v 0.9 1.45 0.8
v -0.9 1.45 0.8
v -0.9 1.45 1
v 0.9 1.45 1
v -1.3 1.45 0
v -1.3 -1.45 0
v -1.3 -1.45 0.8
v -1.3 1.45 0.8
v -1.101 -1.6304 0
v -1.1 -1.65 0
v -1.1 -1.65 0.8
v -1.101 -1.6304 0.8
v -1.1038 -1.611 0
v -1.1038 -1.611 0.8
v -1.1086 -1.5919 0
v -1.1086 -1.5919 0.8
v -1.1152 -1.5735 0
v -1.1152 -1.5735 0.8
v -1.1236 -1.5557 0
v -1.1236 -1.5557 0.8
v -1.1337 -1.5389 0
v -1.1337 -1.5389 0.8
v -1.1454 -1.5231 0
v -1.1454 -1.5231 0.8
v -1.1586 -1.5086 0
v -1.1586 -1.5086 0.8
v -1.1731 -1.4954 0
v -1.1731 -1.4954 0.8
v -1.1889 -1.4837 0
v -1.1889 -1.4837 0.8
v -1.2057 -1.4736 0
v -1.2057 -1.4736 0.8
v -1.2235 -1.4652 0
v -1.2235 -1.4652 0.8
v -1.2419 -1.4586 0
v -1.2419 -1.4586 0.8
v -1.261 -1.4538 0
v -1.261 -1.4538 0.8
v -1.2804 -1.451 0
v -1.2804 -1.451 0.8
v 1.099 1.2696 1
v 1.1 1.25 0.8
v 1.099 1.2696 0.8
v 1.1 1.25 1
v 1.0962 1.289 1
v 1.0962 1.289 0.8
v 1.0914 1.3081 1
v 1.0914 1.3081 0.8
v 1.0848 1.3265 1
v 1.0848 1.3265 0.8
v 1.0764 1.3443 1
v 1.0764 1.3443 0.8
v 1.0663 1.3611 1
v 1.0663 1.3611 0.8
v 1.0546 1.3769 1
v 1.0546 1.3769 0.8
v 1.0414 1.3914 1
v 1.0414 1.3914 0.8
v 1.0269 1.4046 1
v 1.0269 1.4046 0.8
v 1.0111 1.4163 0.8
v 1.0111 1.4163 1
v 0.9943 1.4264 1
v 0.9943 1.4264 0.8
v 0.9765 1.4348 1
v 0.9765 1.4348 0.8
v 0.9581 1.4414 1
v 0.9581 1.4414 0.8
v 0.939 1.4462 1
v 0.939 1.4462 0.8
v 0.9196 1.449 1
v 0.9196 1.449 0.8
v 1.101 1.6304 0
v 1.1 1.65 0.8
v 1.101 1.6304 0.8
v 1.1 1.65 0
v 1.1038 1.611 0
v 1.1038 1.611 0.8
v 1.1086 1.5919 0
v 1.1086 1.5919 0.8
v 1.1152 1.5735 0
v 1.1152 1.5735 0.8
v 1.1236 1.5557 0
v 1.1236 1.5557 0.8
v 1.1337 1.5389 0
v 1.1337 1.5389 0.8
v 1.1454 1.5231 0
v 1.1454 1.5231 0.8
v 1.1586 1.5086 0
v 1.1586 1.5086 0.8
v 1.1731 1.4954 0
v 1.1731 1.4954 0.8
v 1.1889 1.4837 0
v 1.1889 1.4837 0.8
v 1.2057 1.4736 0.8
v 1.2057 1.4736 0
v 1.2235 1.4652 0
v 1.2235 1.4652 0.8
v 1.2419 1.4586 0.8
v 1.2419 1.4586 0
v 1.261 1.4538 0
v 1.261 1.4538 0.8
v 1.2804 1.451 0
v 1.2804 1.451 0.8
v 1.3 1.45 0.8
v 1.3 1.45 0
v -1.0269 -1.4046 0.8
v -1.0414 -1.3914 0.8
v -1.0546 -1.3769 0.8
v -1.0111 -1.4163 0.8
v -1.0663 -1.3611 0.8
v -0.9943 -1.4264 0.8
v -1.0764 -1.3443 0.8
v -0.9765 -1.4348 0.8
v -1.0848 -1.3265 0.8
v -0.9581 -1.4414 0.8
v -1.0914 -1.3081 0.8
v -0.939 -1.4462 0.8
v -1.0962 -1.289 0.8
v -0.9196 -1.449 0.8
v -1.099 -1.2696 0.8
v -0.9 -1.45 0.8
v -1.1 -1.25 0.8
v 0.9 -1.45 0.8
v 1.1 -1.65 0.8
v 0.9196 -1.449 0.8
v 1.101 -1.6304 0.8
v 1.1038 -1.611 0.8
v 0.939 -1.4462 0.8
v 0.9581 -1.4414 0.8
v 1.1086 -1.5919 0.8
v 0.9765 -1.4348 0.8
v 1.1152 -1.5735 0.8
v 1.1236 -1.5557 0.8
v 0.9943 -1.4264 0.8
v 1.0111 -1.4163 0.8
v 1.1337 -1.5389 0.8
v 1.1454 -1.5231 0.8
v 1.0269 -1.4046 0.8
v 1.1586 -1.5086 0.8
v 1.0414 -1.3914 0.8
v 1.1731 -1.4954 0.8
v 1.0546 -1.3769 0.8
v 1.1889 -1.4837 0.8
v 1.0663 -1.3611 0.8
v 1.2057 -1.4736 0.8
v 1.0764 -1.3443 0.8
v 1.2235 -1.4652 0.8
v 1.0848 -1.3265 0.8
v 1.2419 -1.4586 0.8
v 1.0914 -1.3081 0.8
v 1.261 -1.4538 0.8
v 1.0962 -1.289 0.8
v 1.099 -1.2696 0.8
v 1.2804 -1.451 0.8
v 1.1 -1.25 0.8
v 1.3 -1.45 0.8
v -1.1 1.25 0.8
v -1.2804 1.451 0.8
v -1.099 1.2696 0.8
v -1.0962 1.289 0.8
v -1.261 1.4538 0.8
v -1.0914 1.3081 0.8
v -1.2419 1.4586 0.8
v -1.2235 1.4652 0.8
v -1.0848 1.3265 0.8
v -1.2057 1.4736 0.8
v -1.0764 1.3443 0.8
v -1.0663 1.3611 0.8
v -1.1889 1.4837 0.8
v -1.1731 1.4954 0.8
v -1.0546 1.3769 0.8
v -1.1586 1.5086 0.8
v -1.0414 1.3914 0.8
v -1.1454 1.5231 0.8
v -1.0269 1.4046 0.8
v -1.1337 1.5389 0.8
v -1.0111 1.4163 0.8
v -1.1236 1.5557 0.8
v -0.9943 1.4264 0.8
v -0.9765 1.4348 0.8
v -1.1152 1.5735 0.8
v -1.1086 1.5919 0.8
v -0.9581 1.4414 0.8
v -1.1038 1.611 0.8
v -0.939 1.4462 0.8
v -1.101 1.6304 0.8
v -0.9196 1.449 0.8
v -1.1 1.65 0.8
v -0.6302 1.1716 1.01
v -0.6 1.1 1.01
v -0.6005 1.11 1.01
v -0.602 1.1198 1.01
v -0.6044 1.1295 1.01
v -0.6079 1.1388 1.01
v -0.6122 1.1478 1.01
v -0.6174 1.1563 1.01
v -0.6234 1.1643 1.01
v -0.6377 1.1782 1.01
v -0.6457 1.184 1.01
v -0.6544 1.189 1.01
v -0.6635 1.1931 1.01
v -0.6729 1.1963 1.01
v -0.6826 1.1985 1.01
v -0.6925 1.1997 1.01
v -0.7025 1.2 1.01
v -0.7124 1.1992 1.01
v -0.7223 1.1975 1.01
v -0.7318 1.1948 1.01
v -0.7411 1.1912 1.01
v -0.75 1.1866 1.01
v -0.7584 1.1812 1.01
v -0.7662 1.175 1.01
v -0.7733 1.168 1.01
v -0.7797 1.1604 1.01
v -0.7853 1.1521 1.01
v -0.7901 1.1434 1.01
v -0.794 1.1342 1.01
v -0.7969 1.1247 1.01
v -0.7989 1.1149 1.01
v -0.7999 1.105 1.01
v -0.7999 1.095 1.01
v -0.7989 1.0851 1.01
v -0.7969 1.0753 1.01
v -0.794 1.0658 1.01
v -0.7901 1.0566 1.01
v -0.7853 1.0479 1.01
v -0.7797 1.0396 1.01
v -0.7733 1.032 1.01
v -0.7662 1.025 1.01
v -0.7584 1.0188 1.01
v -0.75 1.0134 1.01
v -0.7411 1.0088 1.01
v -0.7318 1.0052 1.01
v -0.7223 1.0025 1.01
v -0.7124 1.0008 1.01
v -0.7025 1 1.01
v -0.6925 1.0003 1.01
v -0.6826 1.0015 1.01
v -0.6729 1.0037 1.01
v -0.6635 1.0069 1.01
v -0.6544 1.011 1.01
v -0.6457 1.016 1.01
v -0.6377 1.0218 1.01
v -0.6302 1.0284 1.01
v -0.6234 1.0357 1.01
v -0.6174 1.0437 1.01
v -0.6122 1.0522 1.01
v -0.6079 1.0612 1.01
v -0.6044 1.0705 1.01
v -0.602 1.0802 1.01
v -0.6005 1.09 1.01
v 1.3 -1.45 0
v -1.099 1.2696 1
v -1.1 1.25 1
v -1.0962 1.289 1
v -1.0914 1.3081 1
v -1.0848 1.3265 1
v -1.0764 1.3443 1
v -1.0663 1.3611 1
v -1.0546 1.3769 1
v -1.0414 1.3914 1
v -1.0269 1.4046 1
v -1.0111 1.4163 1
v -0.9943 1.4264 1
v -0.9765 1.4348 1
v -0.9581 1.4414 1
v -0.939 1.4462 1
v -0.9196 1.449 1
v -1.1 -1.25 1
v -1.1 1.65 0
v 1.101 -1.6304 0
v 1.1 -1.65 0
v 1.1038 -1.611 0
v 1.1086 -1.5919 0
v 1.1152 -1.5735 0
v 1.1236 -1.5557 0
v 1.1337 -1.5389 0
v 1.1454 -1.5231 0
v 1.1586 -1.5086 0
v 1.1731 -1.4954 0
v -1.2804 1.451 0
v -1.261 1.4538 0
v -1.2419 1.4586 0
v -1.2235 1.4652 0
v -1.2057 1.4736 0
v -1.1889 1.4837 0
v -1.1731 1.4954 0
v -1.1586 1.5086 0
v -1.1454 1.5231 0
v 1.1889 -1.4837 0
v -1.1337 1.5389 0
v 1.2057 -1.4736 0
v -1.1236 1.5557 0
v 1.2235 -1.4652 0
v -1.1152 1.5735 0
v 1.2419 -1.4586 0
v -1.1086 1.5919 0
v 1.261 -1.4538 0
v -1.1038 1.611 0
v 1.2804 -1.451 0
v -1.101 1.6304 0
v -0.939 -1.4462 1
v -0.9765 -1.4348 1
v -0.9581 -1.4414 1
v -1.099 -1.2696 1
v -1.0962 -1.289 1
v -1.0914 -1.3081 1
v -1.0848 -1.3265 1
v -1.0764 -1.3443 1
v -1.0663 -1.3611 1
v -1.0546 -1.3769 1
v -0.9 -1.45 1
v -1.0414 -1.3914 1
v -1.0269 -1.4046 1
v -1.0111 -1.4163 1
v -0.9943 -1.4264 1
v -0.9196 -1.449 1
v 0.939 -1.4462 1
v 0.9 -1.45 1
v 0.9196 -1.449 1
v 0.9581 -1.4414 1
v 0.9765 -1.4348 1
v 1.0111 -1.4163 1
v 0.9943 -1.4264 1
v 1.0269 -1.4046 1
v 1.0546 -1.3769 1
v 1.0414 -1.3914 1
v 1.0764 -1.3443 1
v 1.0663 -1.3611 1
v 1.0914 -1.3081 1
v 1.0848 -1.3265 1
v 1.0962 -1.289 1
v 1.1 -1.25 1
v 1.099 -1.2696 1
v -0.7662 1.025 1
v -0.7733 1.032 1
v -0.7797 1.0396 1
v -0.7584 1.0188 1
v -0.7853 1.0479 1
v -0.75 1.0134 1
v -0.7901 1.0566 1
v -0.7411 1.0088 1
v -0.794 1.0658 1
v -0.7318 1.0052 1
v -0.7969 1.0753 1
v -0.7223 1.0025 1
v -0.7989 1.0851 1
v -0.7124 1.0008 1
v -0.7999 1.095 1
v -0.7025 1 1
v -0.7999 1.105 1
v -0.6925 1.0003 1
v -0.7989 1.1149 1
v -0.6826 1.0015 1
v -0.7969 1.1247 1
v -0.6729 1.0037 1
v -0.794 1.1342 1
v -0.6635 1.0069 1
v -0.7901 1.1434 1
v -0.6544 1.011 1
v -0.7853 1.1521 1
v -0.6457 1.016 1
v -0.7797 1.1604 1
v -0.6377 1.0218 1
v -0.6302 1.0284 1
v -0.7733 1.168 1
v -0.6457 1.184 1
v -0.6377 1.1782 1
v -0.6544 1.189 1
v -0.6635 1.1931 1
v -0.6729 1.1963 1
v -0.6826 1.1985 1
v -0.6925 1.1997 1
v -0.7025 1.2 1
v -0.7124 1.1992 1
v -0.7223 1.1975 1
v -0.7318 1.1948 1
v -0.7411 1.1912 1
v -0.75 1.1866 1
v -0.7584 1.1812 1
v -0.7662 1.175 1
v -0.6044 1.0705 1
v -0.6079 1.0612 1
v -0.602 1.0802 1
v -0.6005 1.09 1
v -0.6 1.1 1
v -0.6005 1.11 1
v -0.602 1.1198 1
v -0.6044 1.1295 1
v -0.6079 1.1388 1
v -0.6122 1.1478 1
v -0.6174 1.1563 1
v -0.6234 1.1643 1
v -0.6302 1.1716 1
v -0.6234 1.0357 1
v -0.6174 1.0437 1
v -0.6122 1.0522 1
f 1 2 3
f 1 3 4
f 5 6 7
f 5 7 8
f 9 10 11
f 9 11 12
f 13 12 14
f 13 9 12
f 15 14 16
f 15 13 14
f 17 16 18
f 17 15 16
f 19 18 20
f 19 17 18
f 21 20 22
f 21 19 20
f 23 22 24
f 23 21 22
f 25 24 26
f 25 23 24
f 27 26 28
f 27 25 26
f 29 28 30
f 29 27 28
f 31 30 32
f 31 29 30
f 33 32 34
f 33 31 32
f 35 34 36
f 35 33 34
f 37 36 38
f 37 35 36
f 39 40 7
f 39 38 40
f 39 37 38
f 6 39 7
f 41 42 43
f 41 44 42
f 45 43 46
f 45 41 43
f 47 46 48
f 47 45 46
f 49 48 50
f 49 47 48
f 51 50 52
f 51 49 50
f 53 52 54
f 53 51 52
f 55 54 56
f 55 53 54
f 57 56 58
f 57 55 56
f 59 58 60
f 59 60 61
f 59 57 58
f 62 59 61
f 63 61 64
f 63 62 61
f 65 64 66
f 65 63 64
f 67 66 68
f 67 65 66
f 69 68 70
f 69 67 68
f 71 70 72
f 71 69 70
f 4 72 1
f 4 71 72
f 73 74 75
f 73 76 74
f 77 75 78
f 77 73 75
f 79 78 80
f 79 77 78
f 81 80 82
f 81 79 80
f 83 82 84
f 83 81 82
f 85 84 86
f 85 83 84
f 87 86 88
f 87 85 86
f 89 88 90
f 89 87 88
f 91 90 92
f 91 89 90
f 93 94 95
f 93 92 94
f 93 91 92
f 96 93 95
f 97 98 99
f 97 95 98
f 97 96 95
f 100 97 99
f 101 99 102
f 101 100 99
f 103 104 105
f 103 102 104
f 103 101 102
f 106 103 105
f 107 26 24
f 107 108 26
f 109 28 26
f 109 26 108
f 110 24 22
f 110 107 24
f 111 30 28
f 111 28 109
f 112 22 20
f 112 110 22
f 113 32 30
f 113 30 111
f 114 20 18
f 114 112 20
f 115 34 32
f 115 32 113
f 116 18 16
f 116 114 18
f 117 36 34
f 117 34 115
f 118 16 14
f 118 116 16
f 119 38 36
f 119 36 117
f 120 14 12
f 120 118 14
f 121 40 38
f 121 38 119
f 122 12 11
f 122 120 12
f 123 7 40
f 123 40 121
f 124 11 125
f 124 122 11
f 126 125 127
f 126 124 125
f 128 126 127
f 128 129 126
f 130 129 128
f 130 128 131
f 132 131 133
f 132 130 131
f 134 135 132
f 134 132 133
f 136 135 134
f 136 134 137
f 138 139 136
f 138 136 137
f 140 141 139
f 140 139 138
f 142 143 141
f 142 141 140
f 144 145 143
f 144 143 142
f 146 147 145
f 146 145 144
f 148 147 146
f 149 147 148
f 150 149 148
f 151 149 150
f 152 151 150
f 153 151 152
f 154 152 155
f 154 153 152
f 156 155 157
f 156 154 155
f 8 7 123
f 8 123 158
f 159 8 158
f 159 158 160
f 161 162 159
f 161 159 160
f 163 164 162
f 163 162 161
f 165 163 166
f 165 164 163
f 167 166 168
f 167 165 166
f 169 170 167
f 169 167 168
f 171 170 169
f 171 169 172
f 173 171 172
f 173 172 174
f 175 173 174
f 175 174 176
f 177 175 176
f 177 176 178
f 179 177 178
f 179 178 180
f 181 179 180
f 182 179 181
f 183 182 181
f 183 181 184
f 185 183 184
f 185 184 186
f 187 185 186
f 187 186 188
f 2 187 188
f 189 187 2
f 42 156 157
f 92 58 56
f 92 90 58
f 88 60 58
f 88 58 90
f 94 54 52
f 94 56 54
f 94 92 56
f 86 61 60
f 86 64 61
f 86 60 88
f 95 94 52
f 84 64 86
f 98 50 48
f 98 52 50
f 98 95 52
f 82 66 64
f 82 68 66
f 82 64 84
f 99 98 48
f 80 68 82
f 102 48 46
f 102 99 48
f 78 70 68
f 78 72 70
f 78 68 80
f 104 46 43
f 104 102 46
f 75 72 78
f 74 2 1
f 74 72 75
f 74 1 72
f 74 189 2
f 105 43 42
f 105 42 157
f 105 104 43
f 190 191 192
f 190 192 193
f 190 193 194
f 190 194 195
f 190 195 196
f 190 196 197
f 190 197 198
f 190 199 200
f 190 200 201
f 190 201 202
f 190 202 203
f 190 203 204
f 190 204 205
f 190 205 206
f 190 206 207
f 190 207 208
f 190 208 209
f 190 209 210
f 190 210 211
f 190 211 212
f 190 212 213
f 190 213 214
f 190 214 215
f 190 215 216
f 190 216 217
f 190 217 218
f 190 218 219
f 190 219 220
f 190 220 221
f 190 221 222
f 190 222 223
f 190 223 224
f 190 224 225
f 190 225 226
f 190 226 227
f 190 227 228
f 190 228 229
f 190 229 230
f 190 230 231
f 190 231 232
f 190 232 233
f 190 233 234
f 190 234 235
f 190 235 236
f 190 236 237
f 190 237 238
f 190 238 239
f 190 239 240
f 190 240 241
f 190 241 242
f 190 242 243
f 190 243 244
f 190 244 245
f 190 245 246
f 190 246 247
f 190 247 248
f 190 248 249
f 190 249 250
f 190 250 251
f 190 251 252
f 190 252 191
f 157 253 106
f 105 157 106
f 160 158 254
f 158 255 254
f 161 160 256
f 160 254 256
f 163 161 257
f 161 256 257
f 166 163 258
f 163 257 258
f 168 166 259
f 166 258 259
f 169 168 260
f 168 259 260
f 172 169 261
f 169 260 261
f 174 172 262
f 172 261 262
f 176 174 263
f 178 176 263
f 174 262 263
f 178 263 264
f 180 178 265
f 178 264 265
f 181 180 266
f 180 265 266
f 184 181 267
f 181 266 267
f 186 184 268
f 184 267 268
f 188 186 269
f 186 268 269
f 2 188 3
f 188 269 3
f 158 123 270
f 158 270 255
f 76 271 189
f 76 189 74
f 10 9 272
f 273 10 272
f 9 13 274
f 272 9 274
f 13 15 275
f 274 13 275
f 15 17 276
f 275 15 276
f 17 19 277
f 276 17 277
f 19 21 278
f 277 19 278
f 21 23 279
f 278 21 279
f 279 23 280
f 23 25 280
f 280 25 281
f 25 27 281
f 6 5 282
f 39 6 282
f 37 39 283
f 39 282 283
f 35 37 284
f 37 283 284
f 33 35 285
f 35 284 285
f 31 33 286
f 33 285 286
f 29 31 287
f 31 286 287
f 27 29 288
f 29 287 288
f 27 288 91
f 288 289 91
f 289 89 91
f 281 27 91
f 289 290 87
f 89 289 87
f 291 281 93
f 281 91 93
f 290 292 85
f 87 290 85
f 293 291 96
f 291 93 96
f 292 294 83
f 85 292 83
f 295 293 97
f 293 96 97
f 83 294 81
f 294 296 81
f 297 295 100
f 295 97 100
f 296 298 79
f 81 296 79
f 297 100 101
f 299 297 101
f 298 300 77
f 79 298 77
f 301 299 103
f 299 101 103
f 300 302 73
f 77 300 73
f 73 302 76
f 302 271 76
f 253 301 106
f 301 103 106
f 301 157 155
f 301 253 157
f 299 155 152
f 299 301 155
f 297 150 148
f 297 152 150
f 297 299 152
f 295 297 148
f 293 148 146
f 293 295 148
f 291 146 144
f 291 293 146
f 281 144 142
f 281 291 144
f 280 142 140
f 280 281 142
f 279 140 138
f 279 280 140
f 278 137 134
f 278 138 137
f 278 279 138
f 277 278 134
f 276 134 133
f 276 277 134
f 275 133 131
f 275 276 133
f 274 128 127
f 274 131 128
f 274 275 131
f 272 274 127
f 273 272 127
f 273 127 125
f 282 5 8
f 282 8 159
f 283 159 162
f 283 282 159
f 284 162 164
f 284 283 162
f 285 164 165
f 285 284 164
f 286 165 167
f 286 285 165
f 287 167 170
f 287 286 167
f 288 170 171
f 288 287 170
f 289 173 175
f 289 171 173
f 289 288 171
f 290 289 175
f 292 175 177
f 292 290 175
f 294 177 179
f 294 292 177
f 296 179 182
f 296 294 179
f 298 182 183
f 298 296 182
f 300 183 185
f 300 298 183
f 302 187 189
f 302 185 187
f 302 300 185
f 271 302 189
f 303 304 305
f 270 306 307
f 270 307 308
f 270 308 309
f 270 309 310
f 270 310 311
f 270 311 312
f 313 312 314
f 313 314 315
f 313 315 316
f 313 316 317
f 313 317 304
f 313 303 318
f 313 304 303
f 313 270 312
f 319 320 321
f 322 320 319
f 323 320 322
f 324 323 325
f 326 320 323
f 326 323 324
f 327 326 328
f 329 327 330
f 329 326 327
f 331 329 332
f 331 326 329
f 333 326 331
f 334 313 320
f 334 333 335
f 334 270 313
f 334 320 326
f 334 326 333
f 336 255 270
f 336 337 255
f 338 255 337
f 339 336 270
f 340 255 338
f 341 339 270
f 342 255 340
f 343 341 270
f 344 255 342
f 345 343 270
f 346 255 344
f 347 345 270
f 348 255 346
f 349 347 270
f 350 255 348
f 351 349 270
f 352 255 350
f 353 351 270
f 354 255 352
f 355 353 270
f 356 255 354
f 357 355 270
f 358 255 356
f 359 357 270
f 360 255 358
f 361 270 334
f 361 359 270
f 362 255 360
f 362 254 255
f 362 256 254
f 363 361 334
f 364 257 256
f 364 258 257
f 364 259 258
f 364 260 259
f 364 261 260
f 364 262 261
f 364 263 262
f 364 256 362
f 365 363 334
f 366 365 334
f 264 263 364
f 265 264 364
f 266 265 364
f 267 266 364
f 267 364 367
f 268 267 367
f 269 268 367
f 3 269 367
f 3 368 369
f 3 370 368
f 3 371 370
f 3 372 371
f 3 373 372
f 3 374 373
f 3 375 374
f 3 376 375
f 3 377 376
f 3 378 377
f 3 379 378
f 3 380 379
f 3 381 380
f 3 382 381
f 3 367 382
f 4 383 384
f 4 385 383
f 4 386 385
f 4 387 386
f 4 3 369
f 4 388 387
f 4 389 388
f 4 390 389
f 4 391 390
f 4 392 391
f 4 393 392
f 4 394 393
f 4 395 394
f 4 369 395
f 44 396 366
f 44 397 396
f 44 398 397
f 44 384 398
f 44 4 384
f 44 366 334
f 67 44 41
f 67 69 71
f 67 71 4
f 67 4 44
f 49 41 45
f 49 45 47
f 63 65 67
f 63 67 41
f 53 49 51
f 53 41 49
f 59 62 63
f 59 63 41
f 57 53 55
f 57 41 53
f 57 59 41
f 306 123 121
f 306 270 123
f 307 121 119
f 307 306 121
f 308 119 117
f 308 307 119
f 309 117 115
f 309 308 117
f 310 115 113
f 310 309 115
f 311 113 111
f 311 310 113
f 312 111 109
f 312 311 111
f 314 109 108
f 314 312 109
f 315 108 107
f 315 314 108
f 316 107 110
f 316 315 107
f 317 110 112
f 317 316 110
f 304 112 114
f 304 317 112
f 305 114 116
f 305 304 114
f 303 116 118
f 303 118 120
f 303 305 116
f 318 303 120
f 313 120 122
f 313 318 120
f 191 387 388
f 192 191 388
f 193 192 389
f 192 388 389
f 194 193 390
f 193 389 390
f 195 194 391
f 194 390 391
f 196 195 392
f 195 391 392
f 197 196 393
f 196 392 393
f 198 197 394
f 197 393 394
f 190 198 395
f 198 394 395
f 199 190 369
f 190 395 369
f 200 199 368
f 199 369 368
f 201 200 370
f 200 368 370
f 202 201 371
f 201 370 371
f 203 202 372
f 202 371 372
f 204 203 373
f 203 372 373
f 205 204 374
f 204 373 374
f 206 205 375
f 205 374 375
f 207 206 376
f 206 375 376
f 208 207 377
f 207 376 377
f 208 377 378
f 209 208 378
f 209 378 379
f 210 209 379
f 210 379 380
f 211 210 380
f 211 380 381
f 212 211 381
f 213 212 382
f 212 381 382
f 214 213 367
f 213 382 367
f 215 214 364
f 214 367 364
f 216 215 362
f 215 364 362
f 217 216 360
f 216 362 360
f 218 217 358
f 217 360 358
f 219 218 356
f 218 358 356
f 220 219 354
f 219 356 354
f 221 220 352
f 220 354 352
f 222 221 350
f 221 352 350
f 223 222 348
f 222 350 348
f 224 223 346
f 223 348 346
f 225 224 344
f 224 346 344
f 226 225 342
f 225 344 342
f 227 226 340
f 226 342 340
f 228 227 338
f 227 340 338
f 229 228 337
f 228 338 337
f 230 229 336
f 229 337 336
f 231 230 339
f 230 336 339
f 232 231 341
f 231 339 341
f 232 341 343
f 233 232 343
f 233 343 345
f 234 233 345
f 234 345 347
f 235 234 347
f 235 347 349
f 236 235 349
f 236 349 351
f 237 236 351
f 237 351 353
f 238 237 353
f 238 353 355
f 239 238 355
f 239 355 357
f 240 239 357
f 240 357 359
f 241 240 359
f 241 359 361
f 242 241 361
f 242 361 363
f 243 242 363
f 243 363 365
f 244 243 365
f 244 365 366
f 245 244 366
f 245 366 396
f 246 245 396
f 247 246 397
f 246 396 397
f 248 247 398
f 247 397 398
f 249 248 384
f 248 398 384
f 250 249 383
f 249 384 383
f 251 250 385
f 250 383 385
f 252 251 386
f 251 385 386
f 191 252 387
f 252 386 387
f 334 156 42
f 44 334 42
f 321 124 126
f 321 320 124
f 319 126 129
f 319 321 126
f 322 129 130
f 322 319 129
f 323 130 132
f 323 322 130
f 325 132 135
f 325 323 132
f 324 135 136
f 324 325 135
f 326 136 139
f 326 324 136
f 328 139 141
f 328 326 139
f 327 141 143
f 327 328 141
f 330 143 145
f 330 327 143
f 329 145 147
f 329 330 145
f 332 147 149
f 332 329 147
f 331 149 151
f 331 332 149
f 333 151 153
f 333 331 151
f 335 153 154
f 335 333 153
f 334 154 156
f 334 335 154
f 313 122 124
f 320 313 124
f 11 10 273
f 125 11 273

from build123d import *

# Parameters (mm, degrees)
BOX001_W          = 2.2
BOX001_H          = 2.9
BOX001_DEPTH      = 0.2
FILLET_R          = 0.2
CYLINDER004_R     = 0.1
CYLINDER004_DEPTH = 0.01
CYLINDER001_R     = 0.2
CYLINDER001_DEPTH = 3
CYLINDER002_R     = 0.2
CYLINDER002_DEPTH = 3
CYLINDER003_R     = 0.2
CYLINDER003_DEPTH = 3
CYLINDER_R        = 0.2
CYLINDER_DEPTH    = 3
BOX_W             = 2.6
BOX_H             = 3.3
BOX_DEPTH         = 0.8


with BuildPart() as fillet_body:
    # Box001 → Box001 (new body)
    with BuildSketch(Plane(origin=(-1.1, -1.45, 0.8), x_dir=(1, 0, 0), z_dir=(0, 0, 1))):
        with Locations((1.1, 1.45)):
            Rectangle(BOX001_W, BOX001_H)
    extrude(amount=BOX001_DEPTH)

    # Fillet
    fillet_edges = [fillet_body.edges().sort_by_distance(p)[0] for p in [
        (-1.1, -1.45, 0.9),
        (-1.1, 1.45, 0.9),
        (1.1, -1.45, 0.9),
        (1.1, 1.45, 0.9),
    ]]
    fillet(fillet_edges, radius=FILLET_R)


with BuildPart() as cylinder004:
    # Cylinder004 → Cylinder004 (new body)
    with BuildSketch(Plane(origin=(-0.7, 1.1, 1), x_dir=(1, 0, 0), z_dir=(0, 0, 1))):
        Circle(CYLINDER004_R)
    extrude(amount=CYLINDER004_DEPTH)


with BuildPart() as cylinder001:
    # Cylinder001 → Cylinder001 (new body)
    with BuildSketch(Plane(origin=(1.3, -1.65, -1), x_dir=(1, 0, 0), z_dir=(0, 0, 1))):
        Circle(CYLINDER001_R)
    extrude(amount=CYLINDER001_DEPTH)


with BuildPart() as cylinder002:
    # Cylinder002 → Cylinder002 (new body)
    with BuildSketch(Plane(origin=(-1.3, 1.65, -1), x_dir=(1, 0, 0), z_dir=(0, 0, 1))):
        Circle(CYLINDER002_R)
    extrude(amount=CYLINDER002_DEPTH)


with BuildPart() as cylinder003:
    # Cylinder003 → Cylinder003 (new body)
    with BuildSketch(Plane(origin=(1.3, 1.65, -1), x_dir=(1, 0, 0), z_dir=(0, 0, 1))):
        Circle(CYLINDER003_R)
    extrude(amount=CYLINDER003_DEPTH)


with BuildPart() as fusion:
    # Cylinder → Cylinder (new body)
    with BuildSketch(Plane(origin=(-1.3, -1.65, -1), x_dir=(1, 0, 0), z_dir=(0, 0, 1))):
        Circle(CYLINDER_R)
    extrude(amount=CYLINDER_DEPTH)

    # Fusion: union Cylinder001, Cylinder002, Cylinder003
    add(cylinder001.part)
    add(cylinder002.part)
    add(cylinder003.part)


with BuildPart() as fusion001:
    # Box → Box (new body)
    with BuildSketch(Plane(origin=(-1.3, -1.65, 0), x_dir=(1, 0, 0), z_dir=(0, 0, 1))):
        with Locations((1.3, 1.65)):
            Rectangle(BOX_W, BOX_H)
    extrude(amount=BOX_DEPTH)

    # Cut: cut Fusion
    add(fusion.part, mode=Mode.SUBTRACT)

    # Fusion001: union Fillet body, Cylinder004
    add(fillet_body.part)
    add(cylinder004.part)


solid = fusion001.part
